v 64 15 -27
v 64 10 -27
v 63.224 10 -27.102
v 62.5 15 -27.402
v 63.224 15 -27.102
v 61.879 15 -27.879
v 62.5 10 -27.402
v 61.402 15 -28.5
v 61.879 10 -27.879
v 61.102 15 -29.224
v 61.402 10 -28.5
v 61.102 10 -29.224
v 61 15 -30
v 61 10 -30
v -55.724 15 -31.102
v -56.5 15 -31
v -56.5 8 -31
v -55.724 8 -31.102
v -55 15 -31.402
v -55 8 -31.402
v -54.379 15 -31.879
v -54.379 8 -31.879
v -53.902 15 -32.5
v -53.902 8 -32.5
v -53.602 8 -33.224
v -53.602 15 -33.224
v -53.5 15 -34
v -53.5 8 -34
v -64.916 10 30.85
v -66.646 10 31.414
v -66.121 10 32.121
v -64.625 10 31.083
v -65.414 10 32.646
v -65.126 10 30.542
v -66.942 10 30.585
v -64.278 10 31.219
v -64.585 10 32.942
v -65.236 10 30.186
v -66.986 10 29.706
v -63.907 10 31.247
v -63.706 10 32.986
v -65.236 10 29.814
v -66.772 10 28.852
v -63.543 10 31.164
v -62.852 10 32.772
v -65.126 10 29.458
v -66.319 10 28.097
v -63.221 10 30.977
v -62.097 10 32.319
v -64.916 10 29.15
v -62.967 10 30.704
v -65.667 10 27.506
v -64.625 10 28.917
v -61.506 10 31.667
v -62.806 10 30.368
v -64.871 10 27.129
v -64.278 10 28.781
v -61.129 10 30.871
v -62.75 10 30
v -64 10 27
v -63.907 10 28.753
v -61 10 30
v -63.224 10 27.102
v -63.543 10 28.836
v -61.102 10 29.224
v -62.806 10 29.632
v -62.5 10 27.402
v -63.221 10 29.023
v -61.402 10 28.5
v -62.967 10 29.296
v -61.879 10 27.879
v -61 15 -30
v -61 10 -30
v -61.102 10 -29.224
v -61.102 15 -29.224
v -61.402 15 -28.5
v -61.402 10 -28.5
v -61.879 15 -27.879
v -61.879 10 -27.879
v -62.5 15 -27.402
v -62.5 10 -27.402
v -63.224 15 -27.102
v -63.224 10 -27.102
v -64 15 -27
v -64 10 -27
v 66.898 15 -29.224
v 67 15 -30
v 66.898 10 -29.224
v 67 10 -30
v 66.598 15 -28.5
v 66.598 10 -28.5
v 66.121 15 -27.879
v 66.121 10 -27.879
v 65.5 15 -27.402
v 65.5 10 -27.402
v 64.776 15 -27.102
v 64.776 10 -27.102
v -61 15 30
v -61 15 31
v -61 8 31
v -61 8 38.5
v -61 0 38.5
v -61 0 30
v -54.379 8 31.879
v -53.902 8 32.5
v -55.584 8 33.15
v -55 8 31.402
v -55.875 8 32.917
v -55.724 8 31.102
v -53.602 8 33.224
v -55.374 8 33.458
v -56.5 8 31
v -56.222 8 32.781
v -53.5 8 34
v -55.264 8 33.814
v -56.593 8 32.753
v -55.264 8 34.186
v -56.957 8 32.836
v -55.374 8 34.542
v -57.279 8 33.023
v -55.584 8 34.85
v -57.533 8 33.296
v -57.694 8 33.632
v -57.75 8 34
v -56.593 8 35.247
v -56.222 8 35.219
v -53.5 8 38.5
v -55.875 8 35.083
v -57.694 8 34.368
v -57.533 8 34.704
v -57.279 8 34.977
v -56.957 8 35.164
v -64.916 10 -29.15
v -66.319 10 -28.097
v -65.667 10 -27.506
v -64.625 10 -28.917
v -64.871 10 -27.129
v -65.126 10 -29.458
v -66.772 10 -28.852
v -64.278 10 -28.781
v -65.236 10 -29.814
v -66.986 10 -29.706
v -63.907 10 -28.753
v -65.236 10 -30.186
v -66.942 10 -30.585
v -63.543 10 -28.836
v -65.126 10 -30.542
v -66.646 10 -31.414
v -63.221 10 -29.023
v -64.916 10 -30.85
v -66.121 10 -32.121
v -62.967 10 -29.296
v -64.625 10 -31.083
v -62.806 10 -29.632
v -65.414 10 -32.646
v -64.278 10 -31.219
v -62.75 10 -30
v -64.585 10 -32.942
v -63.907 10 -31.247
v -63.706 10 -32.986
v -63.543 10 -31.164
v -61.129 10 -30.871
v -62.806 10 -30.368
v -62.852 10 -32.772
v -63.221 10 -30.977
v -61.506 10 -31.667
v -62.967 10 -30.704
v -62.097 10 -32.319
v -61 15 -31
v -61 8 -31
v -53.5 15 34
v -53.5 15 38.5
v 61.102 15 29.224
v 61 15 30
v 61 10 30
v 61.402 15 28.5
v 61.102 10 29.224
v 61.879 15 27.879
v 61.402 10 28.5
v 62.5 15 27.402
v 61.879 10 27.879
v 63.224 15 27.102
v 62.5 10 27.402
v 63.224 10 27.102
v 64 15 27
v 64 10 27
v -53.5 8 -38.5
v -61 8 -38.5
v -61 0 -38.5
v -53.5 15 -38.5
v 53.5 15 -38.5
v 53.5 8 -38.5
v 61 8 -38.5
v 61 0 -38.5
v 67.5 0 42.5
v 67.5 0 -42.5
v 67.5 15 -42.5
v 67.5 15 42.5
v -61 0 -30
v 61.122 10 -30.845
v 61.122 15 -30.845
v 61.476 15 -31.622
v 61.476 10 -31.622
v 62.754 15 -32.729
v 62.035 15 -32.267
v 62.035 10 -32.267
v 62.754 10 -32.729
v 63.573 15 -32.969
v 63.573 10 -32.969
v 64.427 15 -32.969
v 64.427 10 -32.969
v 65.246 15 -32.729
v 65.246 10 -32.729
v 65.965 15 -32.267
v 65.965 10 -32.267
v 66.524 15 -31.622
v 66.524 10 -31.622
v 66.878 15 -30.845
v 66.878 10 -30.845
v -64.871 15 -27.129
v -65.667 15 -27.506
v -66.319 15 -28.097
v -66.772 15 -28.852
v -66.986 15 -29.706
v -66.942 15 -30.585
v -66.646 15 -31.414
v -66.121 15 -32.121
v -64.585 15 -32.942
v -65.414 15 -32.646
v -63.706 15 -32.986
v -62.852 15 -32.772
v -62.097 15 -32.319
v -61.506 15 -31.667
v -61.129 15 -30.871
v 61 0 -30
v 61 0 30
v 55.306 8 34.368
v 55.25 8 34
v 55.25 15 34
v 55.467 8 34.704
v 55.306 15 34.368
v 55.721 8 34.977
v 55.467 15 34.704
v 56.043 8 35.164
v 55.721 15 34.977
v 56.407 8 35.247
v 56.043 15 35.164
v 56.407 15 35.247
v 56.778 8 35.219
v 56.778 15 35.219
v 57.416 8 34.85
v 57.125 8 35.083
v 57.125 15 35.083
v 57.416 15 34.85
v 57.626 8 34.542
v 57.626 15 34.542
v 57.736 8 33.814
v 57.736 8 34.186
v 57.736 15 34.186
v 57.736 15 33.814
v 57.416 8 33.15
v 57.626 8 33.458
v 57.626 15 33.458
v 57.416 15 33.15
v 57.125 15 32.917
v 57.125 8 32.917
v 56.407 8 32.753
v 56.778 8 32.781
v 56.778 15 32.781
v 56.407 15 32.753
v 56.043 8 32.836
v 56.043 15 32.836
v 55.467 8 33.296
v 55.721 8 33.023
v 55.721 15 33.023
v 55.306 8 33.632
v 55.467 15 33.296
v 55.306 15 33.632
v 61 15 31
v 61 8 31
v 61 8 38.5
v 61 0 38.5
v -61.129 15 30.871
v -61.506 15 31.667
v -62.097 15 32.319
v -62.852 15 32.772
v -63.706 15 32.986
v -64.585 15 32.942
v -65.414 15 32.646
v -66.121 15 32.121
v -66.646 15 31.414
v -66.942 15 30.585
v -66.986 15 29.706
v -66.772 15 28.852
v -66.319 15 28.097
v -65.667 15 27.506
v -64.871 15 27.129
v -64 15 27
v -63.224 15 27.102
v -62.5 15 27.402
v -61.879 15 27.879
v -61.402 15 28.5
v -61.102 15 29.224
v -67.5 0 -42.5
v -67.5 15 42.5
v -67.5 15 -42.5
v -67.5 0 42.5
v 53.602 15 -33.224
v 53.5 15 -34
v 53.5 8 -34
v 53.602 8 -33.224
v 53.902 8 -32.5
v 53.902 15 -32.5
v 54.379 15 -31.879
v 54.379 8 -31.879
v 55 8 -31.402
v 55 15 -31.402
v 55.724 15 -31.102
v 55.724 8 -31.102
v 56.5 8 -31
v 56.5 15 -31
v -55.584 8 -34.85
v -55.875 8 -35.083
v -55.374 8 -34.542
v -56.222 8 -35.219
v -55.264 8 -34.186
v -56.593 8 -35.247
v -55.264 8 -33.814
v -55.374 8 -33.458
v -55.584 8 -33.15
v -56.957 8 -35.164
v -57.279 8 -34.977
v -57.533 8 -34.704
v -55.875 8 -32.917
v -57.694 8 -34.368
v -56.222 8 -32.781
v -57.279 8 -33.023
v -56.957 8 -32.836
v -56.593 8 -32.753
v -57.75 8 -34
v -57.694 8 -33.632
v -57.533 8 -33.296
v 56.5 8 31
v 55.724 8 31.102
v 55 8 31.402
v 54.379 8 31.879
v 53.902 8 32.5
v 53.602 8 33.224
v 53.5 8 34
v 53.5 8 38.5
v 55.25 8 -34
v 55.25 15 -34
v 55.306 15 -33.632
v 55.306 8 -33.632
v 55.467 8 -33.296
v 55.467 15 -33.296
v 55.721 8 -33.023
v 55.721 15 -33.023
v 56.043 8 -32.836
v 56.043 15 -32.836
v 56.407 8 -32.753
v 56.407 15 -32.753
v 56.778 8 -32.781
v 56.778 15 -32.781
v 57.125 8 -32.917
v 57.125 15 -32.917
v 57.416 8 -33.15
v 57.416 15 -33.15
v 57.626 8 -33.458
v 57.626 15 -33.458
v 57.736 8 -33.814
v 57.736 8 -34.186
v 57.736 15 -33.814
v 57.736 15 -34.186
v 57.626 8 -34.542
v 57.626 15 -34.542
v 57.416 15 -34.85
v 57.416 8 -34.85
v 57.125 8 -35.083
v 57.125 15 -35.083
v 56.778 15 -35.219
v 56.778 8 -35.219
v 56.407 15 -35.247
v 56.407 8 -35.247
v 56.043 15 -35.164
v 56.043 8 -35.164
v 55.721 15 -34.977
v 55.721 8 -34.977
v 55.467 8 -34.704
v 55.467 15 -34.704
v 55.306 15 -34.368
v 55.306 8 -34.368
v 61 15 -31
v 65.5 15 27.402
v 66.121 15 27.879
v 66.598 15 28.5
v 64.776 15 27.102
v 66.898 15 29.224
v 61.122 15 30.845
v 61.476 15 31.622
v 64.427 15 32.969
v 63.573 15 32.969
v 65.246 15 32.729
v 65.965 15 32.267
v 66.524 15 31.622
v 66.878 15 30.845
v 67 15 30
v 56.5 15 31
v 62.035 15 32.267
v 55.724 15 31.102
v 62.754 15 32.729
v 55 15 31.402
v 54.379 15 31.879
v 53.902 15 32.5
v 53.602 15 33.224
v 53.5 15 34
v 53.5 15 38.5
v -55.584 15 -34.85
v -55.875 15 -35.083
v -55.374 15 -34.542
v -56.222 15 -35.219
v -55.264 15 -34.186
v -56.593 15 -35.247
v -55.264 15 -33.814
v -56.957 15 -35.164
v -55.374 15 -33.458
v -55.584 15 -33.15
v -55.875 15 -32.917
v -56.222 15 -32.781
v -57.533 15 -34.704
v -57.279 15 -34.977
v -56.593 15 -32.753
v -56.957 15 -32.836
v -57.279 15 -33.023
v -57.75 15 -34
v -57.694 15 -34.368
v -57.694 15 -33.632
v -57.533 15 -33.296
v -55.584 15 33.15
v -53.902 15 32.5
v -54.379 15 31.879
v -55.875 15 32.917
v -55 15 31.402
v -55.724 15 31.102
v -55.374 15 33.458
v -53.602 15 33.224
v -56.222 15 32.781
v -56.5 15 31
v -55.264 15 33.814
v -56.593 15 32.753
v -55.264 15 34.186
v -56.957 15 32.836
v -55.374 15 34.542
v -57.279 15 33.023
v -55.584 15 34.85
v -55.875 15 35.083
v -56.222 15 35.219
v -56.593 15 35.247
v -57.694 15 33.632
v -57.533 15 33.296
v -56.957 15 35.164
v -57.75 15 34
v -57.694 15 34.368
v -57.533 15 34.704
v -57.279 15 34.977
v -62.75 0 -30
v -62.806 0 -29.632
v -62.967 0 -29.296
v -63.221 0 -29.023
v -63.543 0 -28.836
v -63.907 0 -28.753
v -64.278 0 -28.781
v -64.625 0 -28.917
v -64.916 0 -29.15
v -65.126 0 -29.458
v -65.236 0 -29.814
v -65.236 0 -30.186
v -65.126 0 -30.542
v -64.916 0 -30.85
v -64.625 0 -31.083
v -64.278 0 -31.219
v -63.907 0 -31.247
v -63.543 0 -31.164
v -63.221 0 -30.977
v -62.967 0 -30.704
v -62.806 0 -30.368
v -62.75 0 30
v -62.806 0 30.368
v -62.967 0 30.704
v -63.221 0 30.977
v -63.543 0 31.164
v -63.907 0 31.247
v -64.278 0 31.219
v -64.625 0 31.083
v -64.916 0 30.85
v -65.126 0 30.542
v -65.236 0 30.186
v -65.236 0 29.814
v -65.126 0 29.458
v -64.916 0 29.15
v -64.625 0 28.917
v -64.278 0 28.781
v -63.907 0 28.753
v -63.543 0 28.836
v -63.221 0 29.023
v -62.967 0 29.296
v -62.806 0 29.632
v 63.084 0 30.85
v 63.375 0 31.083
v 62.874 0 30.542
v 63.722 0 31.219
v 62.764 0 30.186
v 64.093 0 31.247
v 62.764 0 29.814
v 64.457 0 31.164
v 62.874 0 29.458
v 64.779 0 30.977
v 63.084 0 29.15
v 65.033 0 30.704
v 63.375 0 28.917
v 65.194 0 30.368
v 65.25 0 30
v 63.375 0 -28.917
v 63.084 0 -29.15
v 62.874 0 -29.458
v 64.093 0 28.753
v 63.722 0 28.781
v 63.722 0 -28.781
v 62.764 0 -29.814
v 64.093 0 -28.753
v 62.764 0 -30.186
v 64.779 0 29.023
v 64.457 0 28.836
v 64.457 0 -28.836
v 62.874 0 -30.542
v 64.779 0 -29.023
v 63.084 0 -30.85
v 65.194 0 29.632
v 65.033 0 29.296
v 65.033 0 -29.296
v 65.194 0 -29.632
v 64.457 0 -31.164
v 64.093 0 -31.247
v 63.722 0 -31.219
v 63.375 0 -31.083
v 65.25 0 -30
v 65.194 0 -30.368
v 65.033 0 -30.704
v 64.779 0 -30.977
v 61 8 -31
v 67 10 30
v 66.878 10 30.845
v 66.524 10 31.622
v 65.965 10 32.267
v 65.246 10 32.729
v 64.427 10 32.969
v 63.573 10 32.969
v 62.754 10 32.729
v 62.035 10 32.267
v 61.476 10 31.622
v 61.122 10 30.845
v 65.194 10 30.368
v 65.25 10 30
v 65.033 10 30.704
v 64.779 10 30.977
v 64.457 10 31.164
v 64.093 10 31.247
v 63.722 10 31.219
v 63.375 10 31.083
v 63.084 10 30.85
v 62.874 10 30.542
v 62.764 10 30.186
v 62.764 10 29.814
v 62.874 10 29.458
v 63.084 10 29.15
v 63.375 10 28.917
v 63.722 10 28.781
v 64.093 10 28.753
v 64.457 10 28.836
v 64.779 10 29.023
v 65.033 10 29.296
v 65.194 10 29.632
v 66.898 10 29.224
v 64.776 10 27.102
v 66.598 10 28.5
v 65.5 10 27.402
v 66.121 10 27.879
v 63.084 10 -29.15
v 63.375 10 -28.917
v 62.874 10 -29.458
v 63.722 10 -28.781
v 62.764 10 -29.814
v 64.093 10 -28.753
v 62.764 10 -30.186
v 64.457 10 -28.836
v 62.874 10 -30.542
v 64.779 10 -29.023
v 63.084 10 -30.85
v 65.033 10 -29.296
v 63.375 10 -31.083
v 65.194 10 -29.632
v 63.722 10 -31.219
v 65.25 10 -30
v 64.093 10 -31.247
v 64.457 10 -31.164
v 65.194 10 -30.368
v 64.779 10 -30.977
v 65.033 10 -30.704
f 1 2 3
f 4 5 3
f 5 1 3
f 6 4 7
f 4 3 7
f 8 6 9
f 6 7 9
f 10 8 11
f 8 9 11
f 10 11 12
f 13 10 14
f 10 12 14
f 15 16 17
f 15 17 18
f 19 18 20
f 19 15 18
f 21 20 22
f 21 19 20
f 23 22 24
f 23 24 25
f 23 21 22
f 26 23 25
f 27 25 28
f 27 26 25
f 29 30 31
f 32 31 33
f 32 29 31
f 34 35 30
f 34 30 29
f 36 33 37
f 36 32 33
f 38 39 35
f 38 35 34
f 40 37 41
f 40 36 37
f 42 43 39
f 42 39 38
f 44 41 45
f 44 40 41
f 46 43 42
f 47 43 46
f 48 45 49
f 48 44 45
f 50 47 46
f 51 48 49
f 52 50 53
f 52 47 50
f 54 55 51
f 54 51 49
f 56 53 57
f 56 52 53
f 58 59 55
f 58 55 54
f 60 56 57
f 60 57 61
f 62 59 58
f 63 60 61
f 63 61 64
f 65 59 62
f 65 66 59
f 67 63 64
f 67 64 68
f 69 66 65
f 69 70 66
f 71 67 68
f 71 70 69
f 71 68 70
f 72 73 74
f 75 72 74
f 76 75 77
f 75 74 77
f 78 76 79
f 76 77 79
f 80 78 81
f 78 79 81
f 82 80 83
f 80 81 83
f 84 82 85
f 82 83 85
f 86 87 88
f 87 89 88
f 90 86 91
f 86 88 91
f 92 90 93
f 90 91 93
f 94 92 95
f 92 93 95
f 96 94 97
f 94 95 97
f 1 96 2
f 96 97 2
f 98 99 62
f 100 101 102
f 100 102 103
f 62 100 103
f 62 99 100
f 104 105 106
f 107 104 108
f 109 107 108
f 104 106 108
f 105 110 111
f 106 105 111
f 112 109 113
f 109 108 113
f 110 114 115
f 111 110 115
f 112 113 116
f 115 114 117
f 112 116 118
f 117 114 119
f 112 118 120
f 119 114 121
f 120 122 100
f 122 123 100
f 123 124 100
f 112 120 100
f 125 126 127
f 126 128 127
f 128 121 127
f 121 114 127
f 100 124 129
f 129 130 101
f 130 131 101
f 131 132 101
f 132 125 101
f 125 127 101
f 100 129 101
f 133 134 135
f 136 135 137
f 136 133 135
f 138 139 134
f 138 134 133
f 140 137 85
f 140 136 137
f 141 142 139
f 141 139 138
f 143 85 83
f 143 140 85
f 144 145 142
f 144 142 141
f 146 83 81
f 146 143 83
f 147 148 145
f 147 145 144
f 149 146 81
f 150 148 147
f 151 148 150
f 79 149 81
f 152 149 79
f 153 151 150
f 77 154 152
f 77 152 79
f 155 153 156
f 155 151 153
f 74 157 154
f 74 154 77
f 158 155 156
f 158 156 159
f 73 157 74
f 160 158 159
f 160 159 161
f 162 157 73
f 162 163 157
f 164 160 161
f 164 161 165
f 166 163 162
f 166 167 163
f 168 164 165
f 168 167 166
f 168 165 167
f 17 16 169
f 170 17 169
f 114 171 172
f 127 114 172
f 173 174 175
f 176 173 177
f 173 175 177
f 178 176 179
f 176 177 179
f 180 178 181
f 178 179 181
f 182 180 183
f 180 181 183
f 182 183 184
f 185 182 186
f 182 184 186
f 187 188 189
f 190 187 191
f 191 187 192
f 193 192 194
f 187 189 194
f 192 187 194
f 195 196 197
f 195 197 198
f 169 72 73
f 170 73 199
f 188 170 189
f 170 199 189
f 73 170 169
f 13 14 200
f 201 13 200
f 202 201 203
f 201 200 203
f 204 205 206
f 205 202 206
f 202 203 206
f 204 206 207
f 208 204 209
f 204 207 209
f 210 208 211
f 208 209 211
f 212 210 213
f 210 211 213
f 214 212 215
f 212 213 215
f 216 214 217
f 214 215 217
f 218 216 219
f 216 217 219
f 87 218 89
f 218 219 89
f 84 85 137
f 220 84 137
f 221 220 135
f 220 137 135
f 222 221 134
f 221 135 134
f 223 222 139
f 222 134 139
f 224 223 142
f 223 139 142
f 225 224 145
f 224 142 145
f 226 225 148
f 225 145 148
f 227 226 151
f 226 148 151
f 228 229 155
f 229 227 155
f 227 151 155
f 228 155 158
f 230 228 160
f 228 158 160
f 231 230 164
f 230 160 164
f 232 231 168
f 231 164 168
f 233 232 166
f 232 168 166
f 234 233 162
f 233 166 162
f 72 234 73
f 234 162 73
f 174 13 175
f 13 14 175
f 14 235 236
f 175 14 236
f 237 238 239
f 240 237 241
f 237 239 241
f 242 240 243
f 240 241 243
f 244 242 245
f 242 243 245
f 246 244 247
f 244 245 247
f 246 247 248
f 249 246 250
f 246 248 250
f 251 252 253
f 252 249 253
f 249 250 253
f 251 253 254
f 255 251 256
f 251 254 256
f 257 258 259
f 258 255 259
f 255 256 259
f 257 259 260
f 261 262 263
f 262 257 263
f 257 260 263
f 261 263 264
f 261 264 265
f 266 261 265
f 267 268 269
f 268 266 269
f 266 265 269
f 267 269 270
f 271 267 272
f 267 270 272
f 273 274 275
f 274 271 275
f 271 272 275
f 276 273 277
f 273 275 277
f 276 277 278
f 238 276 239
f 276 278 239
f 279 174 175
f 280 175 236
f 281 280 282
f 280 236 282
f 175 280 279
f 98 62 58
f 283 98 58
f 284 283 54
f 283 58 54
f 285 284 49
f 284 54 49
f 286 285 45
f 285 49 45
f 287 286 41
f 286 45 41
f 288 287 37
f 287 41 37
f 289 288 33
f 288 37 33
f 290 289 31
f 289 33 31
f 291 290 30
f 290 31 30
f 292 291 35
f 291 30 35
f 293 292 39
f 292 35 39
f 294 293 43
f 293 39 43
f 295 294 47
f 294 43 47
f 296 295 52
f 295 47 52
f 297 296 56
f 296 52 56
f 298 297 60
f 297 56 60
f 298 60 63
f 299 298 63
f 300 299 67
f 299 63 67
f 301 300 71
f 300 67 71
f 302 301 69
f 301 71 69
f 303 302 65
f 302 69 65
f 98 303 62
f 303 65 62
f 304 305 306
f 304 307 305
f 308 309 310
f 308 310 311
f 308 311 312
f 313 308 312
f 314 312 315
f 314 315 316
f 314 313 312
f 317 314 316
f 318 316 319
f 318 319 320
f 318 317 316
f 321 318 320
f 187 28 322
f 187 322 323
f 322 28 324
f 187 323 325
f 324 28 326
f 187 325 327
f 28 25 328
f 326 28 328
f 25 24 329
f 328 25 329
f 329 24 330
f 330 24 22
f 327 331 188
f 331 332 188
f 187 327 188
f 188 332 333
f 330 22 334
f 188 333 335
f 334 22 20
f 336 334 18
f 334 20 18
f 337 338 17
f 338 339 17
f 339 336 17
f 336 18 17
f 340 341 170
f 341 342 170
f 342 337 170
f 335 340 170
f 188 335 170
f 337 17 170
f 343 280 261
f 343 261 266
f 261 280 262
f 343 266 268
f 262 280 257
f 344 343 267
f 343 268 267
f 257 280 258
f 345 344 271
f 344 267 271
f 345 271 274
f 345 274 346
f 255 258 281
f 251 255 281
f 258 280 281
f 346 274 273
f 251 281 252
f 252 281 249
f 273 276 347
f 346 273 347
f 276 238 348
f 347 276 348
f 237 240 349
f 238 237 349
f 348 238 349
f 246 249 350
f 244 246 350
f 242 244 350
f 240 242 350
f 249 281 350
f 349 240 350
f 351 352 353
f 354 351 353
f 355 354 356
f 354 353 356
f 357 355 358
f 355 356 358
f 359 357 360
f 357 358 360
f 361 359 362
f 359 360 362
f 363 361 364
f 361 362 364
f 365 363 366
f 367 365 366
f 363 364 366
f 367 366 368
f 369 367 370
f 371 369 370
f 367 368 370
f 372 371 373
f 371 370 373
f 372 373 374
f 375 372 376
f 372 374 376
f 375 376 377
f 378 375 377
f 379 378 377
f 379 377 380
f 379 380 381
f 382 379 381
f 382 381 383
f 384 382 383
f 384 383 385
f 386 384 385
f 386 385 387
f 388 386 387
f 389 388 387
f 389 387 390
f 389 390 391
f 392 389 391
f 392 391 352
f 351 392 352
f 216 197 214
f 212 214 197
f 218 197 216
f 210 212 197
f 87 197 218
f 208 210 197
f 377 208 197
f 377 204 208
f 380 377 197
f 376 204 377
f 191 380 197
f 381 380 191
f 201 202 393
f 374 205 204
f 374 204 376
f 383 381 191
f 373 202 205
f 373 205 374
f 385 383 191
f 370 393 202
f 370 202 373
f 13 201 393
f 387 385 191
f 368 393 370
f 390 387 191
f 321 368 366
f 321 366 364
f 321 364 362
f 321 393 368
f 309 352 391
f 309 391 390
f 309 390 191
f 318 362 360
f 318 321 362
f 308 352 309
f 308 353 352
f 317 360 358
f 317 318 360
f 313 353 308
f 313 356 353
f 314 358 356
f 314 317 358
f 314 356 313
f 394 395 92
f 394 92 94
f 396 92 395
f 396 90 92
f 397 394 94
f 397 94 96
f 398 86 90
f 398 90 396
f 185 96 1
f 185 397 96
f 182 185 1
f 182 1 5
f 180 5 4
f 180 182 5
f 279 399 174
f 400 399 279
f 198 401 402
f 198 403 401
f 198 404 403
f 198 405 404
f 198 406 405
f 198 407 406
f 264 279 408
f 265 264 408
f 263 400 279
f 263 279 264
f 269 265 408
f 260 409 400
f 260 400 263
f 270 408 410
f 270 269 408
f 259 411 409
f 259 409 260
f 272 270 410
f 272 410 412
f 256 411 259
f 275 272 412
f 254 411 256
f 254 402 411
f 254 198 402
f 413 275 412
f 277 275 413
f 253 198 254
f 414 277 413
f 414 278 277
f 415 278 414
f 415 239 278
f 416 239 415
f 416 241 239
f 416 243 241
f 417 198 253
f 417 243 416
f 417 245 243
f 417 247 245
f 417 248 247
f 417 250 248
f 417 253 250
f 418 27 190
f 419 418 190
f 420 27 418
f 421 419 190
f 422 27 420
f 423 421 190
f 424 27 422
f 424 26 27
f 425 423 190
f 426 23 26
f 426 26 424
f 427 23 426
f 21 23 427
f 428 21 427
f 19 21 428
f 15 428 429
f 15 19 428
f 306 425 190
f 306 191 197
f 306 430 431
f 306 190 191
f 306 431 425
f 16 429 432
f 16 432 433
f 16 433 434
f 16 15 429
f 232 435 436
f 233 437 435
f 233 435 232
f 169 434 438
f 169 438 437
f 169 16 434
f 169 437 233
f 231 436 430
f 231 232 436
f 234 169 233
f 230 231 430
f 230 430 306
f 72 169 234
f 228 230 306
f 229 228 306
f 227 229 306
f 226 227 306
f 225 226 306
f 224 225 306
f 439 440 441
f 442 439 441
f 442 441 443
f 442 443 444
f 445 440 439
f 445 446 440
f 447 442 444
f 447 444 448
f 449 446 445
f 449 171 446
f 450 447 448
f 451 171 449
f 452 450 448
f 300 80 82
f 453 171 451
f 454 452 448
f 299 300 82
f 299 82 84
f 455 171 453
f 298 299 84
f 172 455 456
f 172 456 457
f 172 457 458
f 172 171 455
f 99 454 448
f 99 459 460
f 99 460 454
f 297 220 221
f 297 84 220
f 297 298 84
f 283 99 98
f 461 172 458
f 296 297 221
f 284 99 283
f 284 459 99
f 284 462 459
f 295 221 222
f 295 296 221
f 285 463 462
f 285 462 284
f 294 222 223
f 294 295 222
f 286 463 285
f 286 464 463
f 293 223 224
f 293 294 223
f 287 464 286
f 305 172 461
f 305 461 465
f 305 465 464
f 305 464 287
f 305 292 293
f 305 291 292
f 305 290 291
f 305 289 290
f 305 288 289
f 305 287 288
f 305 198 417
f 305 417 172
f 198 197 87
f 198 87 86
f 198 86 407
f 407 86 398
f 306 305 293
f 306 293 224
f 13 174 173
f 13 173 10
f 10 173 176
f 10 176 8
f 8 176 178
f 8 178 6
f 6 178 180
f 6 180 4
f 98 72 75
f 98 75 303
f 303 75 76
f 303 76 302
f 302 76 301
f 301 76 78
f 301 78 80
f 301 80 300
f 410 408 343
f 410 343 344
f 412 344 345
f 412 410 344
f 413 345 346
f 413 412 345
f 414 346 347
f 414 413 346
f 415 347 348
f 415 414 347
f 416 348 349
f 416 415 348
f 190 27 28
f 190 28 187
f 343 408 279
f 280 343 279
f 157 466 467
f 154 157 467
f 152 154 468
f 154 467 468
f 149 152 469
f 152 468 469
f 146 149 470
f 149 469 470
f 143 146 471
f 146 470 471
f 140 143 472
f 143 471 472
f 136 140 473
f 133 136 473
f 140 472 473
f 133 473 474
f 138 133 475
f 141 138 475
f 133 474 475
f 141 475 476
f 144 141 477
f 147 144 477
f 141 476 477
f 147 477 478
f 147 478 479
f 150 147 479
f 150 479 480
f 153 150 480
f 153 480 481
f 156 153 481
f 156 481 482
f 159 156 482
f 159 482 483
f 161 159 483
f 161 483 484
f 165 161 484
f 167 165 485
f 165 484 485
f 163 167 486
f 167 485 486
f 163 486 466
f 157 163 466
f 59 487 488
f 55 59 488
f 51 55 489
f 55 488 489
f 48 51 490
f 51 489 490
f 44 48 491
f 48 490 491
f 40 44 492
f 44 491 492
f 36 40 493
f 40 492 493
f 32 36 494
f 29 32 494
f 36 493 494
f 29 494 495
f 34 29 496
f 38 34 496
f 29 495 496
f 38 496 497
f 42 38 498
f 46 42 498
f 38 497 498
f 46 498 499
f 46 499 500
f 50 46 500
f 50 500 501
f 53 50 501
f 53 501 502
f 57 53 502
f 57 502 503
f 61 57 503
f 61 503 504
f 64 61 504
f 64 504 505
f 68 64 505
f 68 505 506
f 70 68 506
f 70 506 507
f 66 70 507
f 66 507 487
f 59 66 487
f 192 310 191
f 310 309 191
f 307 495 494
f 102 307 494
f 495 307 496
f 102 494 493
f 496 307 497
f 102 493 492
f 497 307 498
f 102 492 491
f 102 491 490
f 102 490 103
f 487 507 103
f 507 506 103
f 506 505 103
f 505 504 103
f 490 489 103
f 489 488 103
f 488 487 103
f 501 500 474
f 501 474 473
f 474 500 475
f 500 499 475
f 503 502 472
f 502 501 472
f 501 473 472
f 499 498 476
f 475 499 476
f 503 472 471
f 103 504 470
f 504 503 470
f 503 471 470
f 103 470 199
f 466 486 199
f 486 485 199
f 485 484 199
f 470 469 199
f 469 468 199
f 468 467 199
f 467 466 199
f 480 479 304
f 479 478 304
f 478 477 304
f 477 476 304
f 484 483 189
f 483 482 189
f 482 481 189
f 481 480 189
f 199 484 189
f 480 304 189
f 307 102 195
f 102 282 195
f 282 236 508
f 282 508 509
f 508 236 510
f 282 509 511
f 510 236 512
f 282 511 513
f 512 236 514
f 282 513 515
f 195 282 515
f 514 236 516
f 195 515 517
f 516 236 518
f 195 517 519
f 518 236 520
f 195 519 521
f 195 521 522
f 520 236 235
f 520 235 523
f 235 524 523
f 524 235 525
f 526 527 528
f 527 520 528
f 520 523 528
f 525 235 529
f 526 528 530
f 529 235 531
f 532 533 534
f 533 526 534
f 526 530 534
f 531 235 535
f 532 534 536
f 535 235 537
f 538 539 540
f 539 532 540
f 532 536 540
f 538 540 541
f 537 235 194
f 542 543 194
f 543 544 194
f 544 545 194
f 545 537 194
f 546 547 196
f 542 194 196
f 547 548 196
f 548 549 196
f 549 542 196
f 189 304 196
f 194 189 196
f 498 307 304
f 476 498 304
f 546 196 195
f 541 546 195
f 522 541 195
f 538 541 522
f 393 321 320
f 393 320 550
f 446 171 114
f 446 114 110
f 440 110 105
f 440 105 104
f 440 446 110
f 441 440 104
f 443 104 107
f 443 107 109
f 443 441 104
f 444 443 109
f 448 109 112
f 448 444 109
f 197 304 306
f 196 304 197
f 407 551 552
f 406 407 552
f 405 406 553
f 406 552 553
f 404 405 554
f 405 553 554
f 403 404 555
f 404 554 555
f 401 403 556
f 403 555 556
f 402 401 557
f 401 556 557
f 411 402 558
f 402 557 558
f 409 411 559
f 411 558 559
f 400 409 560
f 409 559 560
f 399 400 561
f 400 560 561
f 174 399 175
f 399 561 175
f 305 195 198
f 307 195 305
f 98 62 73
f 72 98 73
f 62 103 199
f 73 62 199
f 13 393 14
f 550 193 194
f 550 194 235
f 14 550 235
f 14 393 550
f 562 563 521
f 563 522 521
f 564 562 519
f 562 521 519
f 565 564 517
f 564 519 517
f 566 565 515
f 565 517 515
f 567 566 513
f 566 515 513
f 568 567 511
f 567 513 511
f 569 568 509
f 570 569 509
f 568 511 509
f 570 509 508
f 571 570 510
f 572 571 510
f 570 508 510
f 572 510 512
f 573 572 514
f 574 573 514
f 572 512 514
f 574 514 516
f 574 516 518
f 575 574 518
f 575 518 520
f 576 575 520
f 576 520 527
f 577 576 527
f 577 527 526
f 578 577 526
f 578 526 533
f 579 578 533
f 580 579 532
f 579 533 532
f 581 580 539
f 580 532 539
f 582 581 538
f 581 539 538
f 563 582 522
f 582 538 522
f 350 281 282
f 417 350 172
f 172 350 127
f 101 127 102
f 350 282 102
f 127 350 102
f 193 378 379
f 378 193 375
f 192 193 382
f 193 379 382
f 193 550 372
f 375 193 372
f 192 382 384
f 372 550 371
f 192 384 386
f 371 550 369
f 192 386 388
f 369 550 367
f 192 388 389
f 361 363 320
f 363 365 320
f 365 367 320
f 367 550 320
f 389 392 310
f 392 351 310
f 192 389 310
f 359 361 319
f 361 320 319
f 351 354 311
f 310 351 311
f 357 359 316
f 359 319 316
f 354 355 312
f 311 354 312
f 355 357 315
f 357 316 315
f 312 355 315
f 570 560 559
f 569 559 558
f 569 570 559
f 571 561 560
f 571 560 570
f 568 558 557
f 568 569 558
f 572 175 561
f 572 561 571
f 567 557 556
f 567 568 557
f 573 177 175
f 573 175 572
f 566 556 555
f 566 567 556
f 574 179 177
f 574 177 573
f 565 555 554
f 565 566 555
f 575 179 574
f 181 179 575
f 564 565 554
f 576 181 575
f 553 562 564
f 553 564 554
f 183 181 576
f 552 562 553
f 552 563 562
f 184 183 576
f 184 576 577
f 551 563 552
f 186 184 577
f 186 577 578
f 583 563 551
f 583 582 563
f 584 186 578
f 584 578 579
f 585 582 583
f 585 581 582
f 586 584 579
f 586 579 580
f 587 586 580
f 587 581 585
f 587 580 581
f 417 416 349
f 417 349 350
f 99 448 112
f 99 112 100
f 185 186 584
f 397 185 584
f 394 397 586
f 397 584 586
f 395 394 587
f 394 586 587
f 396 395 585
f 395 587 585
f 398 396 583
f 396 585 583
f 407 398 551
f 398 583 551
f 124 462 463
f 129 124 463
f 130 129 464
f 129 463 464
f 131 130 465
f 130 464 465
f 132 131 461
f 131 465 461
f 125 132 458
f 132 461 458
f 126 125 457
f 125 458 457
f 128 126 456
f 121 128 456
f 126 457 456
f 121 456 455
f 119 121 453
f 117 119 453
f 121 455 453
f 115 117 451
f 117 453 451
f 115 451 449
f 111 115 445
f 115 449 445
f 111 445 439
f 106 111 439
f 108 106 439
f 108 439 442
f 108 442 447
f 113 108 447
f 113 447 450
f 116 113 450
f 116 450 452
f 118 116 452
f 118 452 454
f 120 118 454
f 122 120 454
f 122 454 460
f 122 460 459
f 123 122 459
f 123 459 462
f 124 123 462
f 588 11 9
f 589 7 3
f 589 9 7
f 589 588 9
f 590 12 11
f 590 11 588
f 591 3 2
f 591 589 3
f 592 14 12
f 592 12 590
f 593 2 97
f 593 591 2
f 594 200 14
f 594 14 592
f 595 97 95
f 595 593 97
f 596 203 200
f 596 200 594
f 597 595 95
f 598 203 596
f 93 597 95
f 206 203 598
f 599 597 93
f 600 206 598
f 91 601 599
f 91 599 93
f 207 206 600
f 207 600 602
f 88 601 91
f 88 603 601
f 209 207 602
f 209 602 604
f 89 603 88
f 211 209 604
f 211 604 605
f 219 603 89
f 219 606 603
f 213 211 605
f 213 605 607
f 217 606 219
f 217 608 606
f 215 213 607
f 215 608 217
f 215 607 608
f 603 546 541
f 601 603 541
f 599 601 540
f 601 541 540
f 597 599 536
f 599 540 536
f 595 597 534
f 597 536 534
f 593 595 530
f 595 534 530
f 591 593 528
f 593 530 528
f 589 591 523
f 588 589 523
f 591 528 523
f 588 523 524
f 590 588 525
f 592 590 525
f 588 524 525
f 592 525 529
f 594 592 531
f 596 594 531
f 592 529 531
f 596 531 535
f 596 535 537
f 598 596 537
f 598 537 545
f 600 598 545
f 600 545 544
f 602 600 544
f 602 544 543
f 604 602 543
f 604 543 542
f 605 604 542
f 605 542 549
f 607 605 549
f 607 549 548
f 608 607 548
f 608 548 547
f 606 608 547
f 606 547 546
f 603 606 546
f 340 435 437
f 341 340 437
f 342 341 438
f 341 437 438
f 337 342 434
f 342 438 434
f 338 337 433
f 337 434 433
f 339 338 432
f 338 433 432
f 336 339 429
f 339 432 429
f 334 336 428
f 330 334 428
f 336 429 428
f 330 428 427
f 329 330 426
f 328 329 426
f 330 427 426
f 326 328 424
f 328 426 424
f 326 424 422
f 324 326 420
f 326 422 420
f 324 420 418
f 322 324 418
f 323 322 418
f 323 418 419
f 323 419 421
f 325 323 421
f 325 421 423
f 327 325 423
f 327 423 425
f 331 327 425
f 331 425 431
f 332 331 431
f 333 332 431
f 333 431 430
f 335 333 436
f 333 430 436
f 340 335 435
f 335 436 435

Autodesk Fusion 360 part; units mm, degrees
sketch "Sketch1" plane through (0, 0, 0) normal (0, 1, 0) x (1, 0, 0)
  line L0 (56.5, -34) -> (-56.5, -34)
  line L1 (-56.5, -34) -> (-56.5, 34)
  line L2 (-56.5, 34) -> (56.5, 34)
  line L3 (56.5, 34) -> (56.5, -34)
  line L4 (56.5, -34) -> (-56.5, 34) construction
  line L5 (-56.5, -34) -> (56.5, 34) construction
  line L6 (64, 30) -> (-64, 30)
  line L7 (-64, 30) -> (-64, -30)
  line L8 (-64, -30) -> (64, -30)
  line L9 (64, -30) -> (64, 30)
  line L10 (64, 30) -> (-64, -30) construction
  line L11 (-64, 30) -> (64, -30) construction
  circle A0 centre (64, 30) radius 1.25
  line L12 (60.5, -38) -> (-60.5, -38)
  line L13 (-60.5, -38) -> (-60.5, 38)
  line L14 (-60.5, 38) -> (60.5, 38)
  line L15 (60.5, 38) -> (60.5, -38)
  line L16 (60.5, -38) -> (-60.5, 38) construction
  line L17 (-60.5, -38) -> (60.5, 38) construction
  circle A1 centre (-56.5, 34) radius 1.25
  circle A2 centre (-56.5, 34) radius 3
  circle A3 centre (56.5, 34) radius 1.25
  circle A4 centre (56.5, 34) radius 3
  circle A5 centre (56.5, -34) radius 1.25
  circle A6 centre (56.5, -34) radius 3
  circle A7 centre (-56.5, -34) radius 1.25
  circle A8 centre (-56.5, -34) radius 3
  circle A9 centre (64, -30) radius 1.25
  circle A10 centre (-64, -30) radius 1.25
  circle A11 centre (-64, 30) radius 1.25
  circle A12 centre (-64, 30) radius 3
  circle A13 centre (64, 30) radius 3
  circle A14 centre (64, -30) radius 3
  circle A15 centre (-64, -30) radius 3
  line L18 (61, -38.5) -> (-61, -38.5)
  line L19 (-61, -38.5) -> (-61, 38.5)
  line L20 (-61, 38.5) -> (61, 38.5)
  line L21 (61, 38.5) -> (61, -38.5)
  line L22 (61, -38.5) -> (-61, 38.5) construction
  line L23 (-61, -38.5) -> (61, 38.5) construction
  line L24 (67.5, -42.5) -> (-67.5, -42.5)
  line L25 (-67.5, -42.5) -> (-67.5, 42.5)
  line L26 (-67.5, 42.5) -> (67.5, 42.5)
  line L27 (67.5, 42.5) -> (67.5, -42.5)
  line L28 (67.5, -42.5) -> (-67.5, 42.5) construction
  line L29 (-67.5, -42.5) -> (67.5, 42.5) construction
  dimension "d1" = 113
  dimension "d2" = 68
  dimension "d3" = 128
  dimension "d4" = 60
  dimension "d5" = 2.5
  dimension "d6" = 121
  dimension "d7" = 76
  dimension "d8" = 2.5
  dimension "d9" = 6
  dimension "d10" = 2.5
  dimension "d11" = 6
  dimension "d12" = 2.5
  dimension "d13" = 6
  dimension "d14" = 2.5
  dimension "d15" = 6
  dimension "d16" = 2.5
  dimension "d17" = 2.5
  dimension "d18" = 2.5
  dimension "d19" = 6
  dimension "d20" = 6
  dimension "d21" = 6
  dimension "d22" = 6
  dimension "d25" = 122
  dimension "d26" = 77
  dimension "d27" = 135
  dimension "d28" = 85
extrude "Extrude1" add sketch "Sketch1" along normal blind 8 contours L0 L1 A7 A8 | L0 L1 A7 A8 | L0 L3 A5 A6 | L0 L3 A5 A6 | L1 L2 A1 A2 | L1 L2 A1 A2 | L2 L3 A3 A4 | L2 L3 A3 A4 makes body 1 at (-53.5149, 5.3333, -34.2987) makes body 2 at (-53.5149, 2.6667, 33.7013) makes body 3 at (59.4851, 2.6667, -34.2987) makes body 4 at (59.4851, 2.6667, 33.7013)
extrude "Extrude2" add sketch "Sketch1" along normal blind 15 separate body contours L7 A12 A15 L19 | L9 A13 A14 L21 | L24 L25 L26 L27 makes body 5
extrude "Extrude3" add sketch "Sketch1" along normal blind 10 separate body contours L7 L8 A10 A15 | L7 L8 A10 A15 | L8 L9 A9 A14 | L8 L9 A9 A14 | L6 L7 A11 A12 | L6 L7 A11 A12 | L6 L9 A0 A13 | L6 L9 A0 A13 makes body 6 at (64.5209, 6.6667, 32.9544) makes body 7 at (-61.0149, 6.6667, 29.7013) makes body 8 at (64.9555, 3.3333, -32.8438) makes body 9 at (-61.0149, 3.3333, -30.2987)
sketch "Sketch2" plane through (0, 15, 0) normal (0, 1, 0) x (-1, 0, 0)
  line L0 (61, -38.5) -> (-61, -38.5)
  line L1 (-61, -38.5) -> (-61, -30)
  circle A0 centre (-64, -30) radius 3
  line L2 (-61, -30) -> (-61, 30)
  circle A1 centre (-64, 30) radius 3
  line L3 (-61, 30) -> (-61, 38.5)
  line L4 (-61, 38.5) -> (61, 38.5)
  line L5 (61, 38.5) -> (61, 30)
  circle A2 centre (64, 30) radius 3
  line L6 (61, 30) -> (61, -30)
  circle A3 centre (64, -30) radius 3
  line L7 (61, -30) -> (61, -38.5)
  line L8 (-67.5, -42.5) -> (67.5, -42.5)
  line L9 (67.5, -42.5) -> (67.5, 42.5)
  line L10 (67.5, 42.5) -> (-67.5, 42.5)
  line L11 (-67.5, 42.5) -> (-67.5, -42.5)
  line L12 (-56.5, -34) -> (56.5, -34)
  line L13 (56.5, -34) -> (56.5, 34)
  line L14 (56.5, 34) -> (-56.5, 34)
  line L15 (-56.5, 34) -> (-56.5, -34)
  line L16 (-56.5, -34) -> (56.5, 34) construction
  line L17 (56.5, -34) -> (-56.5, 34) construction
  circle A4 centre (56.5, -34) radius 1.25
  circle A5 centre (56.5, -34) radius 3
  line L18 (56.5, -31) -> (61, -31)
  line L19 (53.5, -34) -> (53.5, -38.5)
  line L20 (0, 0) -> (0, -46.2304) construction
  line L21 (0, 0) -> (-40.9385, 0) construction
  line L22 (-53.5, -34) -> (-53.5, -38.5)
  circle A6 centre (-56.5, -34) radius 3
  circle A7 centre (-56.5, -34) radius 1.25
  line L23 (-56.5, -31) -> (-61, -31)
  line L24 (56.5, 31) -> (61, 31)
  circle A8 centre (56.5, 34) radius 3
  circle A9 centre (56.5, 34) radius 1.25
  line L25 (53.5, 34) -> (53.5, 38.5)
  line L26 (-56.5, 31) -> (-61, 31)
  circle A10 centre (-56.5, 34) radius 3
  circle A11 centre (-56.5, 34) radius 1.25
  line L27 (-53.5, 34) -> (-53.5, 38.5)
  dimension "d33" = 113
  dimension "d34" = 68
  dimension "d35" = 2.5
  dimension "d36" = 6
extrude "Extrude4" add sketch "Sketch2" against normal blind 7 separate body contours L0 L7 A5 L18 L19 | L0 L1 L22 A6 L23 | L12 L13 A4 A5 | L12 L13 A4 A5 | L12 L15 A6 A7 | L12 L15 A6 A7 | L13 L14 A8 A9 | L4 L5 L24 A8 L25 | L13 L14 A8 A9 | L14 L15 A10 A11 | L3 L4 L26 A10 L27 | L14 L15 A10 A11 makes body 10 at (-57.4576, 12.6667, 34.8035) makes body 11 at (55.5036, 10.3333, -34.7548) makes body 12 at (57.6746, 12.6667, 33.5725) makes body 13 at (-55.3254, 10.3333, -33.5725)
combine "Combine1" operation add target body 13 tool bodies 12 11 10 5 9 8 7 6
hidden bodies 1 2 3 4
